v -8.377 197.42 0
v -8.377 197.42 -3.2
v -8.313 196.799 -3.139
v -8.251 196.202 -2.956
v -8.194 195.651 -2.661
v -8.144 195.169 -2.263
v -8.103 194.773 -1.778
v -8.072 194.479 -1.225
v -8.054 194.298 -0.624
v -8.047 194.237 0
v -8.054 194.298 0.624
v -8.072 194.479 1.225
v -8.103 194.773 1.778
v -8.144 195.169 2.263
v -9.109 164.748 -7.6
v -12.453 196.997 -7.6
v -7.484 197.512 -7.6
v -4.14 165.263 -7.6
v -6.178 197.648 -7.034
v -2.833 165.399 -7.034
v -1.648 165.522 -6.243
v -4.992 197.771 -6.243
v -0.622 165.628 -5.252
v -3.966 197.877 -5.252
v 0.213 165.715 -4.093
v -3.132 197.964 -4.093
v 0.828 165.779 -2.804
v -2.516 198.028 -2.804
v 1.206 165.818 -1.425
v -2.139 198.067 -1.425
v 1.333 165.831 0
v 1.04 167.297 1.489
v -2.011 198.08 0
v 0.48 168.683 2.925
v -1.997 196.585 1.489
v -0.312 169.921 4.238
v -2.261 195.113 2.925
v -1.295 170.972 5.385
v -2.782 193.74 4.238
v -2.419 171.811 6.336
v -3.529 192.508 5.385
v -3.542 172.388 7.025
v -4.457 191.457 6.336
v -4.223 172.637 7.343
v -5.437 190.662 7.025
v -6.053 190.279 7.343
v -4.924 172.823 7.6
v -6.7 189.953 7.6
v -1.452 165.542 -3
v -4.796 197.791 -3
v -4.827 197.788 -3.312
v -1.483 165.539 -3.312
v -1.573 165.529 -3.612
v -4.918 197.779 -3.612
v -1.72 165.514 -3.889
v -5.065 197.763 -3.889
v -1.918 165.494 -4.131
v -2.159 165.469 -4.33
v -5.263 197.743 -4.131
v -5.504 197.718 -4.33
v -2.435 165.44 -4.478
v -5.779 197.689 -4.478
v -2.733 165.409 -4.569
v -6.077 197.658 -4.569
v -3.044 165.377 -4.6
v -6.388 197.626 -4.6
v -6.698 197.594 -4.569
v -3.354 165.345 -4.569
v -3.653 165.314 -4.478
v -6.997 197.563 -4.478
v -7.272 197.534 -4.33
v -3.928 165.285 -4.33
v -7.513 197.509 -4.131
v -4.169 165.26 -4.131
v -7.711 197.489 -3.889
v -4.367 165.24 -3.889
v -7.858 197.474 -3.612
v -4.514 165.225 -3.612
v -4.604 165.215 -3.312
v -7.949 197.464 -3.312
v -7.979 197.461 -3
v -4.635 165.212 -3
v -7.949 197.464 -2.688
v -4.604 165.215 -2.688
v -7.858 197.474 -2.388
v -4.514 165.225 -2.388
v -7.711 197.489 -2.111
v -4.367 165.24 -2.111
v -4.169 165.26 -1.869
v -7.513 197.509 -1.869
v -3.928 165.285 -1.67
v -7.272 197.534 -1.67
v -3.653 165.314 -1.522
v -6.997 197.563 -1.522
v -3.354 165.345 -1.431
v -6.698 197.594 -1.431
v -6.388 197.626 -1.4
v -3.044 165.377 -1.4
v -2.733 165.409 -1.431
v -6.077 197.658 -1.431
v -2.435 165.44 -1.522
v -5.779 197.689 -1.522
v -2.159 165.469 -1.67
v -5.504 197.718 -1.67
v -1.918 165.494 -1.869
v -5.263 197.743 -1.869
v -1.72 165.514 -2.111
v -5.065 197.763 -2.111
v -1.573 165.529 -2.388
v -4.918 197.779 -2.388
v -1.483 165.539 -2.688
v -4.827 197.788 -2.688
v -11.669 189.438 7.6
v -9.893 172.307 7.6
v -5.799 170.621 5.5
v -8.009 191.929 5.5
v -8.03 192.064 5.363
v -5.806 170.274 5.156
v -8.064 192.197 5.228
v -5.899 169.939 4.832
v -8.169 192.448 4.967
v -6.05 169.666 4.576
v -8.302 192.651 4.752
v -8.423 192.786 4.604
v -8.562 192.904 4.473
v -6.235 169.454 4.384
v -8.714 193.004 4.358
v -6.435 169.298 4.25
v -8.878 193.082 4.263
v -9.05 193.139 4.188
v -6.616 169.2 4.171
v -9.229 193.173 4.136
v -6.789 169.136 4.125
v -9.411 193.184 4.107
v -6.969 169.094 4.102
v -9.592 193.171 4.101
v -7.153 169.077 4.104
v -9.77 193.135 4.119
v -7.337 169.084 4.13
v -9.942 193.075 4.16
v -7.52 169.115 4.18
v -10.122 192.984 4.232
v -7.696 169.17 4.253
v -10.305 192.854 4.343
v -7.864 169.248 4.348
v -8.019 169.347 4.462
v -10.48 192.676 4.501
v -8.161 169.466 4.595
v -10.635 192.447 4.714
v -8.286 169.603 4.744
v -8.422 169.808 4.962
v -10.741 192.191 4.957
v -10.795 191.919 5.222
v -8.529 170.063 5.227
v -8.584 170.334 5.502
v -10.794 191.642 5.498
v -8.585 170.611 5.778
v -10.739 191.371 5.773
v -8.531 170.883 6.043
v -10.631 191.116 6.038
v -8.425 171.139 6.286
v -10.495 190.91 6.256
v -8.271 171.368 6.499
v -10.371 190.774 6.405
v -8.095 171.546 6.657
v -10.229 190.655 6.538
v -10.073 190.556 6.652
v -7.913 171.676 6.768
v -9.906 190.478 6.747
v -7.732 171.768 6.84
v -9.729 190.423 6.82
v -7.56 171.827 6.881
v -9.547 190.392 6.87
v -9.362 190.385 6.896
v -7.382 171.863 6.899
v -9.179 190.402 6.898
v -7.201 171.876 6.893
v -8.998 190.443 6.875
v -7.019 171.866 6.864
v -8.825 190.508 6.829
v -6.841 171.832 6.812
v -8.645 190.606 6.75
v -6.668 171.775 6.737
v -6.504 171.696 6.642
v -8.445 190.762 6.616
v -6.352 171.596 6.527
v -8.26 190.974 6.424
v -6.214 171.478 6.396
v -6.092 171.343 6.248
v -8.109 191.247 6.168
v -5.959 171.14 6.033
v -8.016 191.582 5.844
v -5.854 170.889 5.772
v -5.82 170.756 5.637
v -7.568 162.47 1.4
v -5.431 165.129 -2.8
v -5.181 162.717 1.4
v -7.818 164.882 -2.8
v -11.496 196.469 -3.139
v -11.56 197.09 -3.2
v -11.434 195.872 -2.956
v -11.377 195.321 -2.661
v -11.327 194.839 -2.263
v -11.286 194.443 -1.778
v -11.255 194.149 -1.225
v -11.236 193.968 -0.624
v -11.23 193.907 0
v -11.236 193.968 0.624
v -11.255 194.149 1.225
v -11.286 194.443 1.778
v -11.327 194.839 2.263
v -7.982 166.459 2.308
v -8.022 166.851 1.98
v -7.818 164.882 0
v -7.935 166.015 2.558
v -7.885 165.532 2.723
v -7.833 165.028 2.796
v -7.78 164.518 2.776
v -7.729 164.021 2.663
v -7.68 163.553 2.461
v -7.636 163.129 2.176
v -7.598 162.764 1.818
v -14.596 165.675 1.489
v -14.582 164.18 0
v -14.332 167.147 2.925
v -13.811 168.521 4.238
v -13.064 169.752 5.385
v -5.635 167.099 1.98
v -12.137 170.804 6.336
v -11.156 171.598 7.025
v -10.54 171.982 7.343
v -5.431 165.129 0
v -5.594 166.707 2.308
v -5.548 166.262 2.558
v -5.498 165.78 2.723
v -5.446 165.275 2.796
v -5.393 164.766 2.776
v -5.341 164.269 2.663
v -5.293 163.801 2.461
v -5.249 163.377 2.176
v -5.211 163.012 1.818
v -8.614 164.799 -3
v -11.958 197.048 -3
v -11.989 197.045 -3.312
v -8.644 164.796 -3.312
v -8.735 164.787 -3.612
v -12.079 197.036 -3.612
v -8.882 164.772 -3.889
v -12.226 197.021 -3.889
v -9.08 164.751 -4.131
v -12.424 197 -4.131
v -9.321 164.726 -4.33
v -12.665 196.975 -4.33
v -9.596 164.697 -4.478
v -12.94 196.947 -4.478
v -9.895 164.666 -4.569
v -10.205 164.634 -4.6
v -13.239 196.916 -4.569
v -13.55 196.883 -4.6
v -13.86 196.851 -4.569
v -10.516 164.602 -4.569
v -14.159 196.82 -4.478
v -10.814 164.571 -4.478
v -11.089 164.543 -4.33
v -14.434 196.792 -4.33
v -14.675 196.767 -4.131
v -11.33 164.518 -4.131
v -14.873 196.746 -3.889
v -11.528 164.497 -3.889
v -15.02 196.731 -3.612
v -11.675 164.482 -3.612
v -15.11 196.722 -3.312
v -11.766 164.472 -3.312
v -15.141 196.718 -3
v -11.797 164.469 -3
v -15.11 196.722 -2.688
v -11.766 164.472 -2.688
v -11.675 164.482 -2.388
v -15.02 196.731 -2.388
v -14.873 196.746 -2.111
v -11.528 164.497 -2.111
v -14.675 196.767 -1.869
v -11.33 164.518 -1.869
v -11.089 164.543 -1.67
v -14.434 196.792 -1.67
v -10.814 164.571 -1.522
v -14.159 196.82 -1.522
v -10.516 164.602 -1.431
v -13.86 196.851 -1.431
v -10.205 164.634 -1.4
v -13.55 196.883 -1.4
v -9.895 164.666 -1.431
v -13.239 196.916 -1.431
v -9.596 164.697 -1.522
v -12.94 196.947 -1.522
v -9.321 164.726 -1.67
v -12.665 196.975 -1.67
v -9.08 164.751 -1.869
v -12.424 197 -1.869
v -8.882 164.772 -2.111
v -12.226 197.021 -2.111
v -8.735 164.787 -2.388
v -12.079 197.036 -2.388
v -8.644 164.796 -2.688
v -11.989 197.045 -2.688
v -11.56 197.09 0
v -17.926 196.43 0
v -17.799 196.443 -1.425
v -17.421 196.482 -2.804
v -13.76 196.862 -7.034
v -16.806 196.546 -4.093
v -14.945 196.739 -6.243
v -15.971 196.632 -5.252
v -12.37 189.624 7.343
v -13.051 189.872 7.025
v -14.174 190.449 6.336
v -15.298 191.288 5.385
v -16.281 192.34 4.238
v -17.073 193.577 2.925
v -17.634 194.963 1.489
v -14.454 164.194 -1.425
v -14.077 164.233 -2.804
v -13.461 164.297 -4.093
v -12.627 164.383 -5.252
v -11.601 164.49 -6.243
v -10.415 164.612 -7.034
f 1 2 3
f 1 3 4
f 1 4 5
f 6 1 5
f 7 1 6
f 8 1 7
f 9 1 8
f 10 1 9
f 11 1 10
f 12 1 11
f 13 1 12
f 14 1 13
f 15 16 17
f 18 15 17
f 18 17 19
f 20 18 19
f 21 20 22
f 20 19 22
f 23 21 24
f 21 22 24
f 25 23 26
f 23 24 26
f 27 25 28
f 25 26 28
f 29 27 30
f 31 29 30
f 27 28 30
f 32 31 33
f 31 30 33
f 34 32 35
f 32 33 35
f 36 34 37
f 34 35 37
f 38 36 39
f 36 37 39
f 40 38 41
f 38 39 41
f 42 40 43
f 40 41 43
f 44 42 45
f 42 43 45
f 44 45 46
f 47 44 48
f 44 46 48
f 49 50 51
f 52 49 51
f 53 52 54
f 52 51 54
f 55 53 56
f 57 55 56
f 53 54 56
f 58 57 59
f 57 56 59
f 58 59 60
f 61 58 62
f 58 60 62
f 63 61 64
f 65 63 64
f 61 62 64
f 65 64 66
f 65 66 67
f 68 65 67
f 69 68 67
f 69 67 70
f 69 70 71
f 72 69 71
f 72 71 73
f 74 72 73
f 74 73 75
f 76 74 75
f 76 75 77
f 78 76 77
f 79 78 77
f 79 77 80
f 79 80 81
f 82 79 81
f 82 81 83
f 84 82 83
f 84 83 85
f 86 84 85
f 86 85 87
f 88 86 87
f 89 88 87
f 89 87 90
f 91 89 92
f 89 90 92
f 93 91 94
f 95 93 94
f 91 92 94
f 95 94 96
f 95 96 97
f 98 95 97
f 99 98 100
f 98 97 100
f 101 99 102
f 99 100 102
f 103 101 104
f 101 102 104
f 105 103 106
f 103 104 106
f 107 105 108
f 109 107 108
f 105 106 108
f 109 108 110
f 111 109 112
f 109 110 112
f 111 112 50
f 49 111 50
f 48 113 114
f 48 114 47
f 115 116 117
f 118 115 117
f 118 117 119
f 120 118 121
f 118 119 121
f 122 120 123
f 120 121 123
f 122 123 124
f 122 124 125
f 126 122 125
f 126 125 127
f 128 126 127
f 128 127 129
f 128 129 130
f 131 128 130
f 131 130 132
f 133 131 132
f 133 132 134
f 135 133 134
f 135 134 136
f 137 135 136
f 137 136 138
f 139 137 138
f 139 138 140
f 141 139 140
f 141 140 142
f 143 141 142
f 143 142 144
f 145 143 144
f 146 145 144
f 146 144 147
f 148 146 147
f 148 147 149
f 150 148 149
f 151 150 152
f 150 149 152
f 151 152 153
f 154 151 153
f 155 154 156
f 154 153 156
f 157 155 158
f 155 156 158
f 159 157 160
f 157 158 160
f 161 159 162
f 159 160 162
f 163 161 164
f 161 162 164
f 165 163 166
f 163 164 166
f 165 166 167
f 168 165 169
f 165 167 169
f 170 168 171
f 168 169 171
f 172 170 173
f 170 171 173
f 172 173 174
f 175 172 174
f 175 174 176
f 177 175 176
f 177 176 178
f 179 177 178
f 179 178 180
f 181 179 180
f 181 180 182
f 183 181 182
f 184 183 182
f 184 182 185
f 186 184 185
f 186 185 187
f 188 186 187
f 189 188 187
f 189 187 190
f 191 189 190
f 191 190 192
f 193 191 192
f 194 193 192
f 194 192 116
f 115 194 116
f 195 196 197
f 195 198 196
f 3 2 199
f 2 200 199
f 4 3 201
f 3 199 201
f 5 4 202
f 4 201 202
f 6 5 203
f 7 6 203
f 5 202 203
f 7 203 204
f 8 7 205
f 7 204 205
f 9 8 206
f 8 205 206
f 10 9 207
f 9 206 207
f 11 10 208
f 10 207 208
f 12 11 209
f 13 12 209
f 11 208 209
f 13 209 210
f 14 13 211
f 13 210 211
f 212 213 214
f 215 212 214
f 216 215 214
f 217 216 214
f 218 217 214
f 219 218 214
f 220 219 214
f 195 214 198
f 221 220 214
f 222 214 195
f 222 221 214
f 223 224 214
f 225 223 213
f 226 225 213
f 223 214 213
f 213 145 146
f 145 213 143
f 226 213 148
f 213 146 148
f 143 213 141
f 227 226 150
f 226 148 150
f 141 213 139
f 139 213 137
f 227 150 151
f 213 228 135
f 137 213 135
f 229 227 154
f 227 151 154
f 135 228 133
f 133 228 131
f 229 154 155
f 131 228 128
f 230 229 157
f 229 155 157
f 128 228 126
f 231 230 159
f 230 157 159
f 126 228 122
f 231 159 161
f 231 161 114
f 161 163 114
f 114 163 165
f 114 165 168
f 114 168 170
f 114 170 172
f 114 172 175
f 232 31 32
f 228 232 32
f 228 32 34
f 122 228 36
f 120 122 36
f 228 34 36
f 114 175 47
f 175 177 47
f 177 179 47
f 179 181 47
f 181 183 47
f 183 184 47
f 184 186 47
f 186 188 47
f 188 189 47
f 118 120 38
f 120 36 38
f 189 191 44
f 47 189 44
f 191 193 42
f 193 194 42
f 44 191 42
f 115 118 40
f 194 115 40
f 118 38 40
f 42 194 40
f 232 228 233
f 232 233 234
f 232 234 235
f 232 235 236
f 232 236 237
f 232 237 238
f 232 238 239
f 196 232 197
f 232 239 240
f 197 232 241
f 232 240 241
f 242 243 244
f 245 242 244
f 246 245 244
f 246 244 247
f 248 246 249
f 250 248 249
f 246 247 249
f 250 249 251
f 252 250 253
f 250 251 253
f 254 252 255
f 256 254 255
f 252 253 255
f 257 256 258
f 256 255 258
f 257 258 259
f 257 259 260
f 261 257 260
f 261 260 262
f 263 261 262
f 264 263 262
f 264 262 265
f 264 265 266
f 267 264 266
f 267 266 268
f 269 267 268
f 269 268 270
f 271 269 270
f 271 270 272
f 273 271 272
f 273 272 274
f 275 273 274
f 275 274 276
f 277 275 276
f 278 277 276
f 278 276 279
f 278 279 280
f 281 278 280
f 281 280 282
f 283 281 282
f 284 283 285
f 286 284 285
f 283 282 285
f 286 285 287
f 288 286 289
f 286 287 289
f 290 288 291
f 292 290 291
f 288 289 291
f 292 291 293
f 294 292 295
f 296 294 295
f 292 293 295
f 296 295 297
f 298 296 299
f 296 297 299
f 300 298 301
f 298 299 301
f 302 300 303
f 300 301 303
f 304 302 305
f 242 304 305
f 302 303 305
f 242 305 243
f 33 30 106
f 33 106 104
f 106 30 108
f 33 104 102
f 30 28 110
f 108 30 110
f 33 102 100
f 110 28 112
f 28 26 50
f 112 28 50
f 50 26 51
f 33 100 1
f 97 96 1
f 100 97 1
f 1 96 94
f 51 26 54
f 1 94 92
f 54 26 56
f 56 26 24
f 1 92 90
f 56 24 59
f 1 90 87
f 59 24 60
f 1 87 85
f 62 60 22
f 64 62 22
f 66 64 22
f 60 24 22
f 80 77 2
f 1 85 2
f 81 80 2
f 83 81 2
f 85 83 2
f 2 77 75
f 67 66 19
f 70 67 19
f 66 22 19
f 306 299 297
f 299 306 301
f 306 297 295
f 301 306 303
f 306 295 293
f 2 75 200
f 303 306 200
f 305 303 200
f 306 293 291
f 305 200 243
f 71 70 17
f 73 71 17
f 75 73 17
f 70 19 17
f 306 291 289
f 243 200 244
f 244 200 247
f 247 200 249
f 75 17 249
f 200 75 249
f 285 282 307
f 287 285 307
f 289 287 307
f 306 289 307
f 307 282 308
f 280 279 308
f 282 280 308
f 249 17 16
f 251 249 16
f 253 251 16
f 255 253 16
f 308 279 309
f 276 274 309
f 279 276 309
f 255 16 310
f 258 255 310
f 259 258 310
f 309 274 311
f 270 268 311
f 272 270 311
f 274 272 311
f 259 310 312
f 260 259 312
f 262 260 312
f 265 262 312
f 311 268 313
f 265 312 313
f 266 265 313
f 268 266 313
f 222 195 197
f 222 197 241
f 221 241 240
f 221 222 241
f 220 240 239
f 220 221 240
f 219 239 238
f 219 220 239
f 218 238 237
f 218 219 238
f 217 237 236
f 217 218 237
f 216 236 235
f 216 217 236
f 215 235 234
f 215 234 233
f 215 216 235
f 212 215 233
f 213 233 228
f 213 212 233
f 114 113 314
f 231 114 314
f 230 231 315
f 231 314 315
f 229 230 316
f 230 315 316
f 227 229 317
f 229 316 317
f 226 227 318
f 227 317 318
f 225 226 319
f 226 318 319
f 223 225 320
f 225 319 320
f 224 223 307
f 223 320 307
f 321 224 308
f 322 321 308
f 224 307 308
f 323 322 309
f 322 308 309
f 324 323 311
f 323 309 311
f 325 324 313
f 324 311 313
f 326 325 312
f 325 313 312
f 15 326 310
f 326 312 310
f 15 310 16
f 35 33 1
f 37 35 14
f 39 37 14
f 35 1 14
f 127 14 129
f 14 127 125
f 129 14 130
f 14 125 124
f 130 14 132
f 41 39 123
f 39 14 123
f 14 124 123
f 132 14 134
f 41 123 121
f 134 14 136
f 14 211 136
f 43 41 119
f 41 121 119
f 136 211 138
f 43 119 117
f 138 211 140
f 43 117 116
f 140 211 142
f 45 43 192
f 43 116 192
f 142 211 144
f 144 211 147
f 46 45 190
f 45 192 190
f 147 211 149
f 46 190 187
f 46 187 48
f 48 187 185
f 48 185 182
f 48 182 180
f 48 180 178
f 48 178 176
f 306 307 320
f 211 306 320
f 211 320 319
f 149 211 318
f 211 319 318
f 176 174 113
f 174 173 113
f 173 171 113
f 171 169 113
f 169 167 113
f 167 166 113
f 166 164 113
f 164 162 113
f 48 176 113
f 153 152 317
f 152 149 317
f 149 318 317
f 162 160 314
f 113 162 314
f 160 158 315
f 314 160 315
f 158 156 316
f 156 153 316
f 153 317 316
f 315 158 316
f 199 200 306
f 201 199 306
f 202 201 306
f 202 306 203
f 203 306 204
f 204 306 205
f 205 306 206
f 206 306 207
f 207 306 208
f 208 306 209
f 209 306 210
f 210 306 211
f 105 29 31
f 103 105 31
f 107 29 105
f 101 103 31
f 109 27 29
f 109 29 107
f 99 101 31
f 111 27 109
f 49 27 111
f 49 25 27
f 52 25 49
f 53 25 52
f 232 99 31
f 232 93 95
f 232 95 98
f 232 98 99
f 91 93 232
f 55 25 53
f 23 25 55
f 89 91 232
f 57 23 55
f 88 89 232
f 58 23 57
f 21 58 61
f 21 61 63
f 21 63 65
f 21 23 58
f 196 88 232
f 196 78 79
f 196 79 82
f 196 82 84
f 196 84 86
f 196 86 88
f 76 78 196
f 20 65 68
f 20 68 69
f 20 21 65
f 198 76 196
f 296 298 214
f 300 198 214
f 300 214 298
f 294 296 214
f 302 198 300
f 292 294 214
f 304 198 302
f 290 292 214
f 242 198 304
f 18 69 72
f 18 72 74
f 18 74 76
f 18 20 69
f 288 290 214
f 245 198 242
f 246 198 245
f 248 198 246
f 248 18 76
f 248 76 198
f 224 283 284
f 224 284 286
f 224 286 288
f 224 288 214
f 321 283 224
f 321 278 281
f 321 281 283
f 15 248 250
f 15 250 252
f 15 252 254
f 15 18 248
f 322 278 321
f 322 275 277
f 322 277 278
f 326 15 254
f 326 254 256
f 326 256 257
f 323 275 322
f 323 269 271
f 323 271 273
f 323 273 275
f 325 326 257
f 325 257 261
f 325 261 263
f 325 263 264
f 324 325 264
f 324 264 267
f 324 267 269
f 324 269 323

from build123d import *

# Parameters (mm, degrees)
SKETCH3_R               = 8
BOSS_EXTRUDE1_DEPTH     = 32.422105263
CUT_EXTRUDE1_DEPTH      = 12.326517504
CUT_EXTRUDE1_DEPTH_BACK = 12.326517504
BOSS_EXTRUDE2_DEPTH     = 1.2
CUT_EXTRUDE2_DEPTH      = 1.6
SKETCH8_R               = 1.4
SKETCH8_R_2             = 1.6
CUT_EXTRUDE3_DEPTH      = 2.64160469
CUT_EXTRUDE3_DEPTH_BACK = 36.765098388
CUT_EXTRUDE4_DEPTH      = 36.765098388


with BuildPart() as part:
    # Sketch3 → Boss-Extrude1 (new body)
    with BuildSketch(Plane(origin=(-20.344467381, 196.178792599, 0), x_dir=(-0.994665758, -0.103150523, 0), z_dir=(0.103150523, -0.994665758, 0))):
        with Locations((-10.431405186, 0)):
            Circle(SKETCH3_R)
    extrude(amount=BOSS_EXTRUDE1_DEPTH)

    # Sketch4 → Cut-Extrude1 (cut, two sides)
    with BuildSketch(Plane(origin=(10.375761543, 1.076004901, 0), x_dir=(0.103150523, -0.994665758, 0), z_dir=(-0.994665758, -0.103150523, 0))) as cut_extrude1_sk:
        Polygon((-197.230869842, 0), (-189.230869842, 8), (-197.230869842, 8), align=None)
        Polygon((-172.808764579, 8), (-164.808764579, 8), (-164.808764579, 0), align=None)
    extrude(amount=CUT_EXTRUDE1_DEPTH, mode=Mode.SUBTRACT)
    extrude(cut_extrude1_sk.sketch, amount=-CUT_EXTRUDE1_DEPTH_BACK, mode=Mode.SUBTRACT)

    # Sketch5 → Boss-Extrude2 (add, symmetric)
    with BuildSketch(Plane(origin=(10.375761543, 1.076004901, 0), x_dir=(0.103150523, -0.994665758, 0), z_dir=(-0.994665758, -0.103150523, 0))):
        with BuildLine():
            Line((-164.808764579, -2.8), (-162.383893448, 1.4))
            ThreePointArc((-162.383893448, 1.4), (-164.443291241, 2.776045612), (-166.788663566, 1.979898987))
            Line((-166.788663566, 1.979898987), (-164.808764579, 0))
            Line((-164.808764579, 0), (-164.808764579, -2.8))
        make_face()
    extrude(amount=BOSS_EXTRUDE2_DEPTH, both=True)

    # Sketch7 → Cut-Extrude2 (cut, symmetric)
    with BuildSketch(Plane(origin=(10.375761543, 1.076004901, 0), x_dir=(0.103150523, -0.994665758, 0), z_dir=(-0.994665758, -0.103150523, 0))):
        with BuildLine():
            Line((-194.968128142, 2.2627417), (-197.230869842, 0))
            Line((-197.230869842, 0), (-197.230869842, -3.2))
            ThreePointArc((-197.230869842, -3.2), (-194.274455338, -1.224586984), (-194.968128142, 2.2627417))
        make_face()
    extrude(amount=CUT_EXTRUDE2_DEPTH, both=True, mode=Mode.SUBTRACT)

    # Sketch8 → Cut-Extrude3 (cut, two sides)
    with BuildSketch(Plane(origin=(-20.344467381, 196.178792599, 0), x_dir=(0.994665758, 0.103150523, 0), z_dir=(-0.103150523, 0.994665758, 0))) as cut_extrude3_sk:
        with Locations((10.431405186, -5.5)):
            Circle(SKETCH8_R)
        with Locations((6.831405186, 3)):
            Circle(SKETCH8_R_2)
        with Locations((14.031405186, 3)):
            Circle(SKETCH8_R_2)
    extrude(amount=CUT_EXTRUDE3_DEPTH, mode=Mode.SUBTRACT)
    extrude(cut_extrude3_sk.sketch, amount=-CUT_EXTRUDE3_DEPTH_BACK, mode=Mode.SUBTRACT)

    # Sketch9 → Cut-Extrude4 (cut, through all)
    with BuildSketch(Plane(origin=(-20.344467381, 196.178792599, 0), x_dir=(0.994665758, 0.103150523, 0), z_dir=(-0.103150523, 0.994665758, 0))):
        with BuildLine():
            Line((7.933405986, 7.6), (12.929404385, 7.6))
            ThreePointArc((12.929404385, 7.6), (10.431405186, 8), (7.933405986, 7.6))
        make_face()
        with BuildLine():
            Line((7.933405986, -7.6), (12.929404385, -7.6))
            ThreePointArc((12.929404385, -7.6), (10.431405186, -8), (7.933405986, -7.6))
        make_face()
    extrude(amount=-CUT_EXTRUDE4_DEPTH, mode=Mode.SUBTRACT)


solid = part.part
